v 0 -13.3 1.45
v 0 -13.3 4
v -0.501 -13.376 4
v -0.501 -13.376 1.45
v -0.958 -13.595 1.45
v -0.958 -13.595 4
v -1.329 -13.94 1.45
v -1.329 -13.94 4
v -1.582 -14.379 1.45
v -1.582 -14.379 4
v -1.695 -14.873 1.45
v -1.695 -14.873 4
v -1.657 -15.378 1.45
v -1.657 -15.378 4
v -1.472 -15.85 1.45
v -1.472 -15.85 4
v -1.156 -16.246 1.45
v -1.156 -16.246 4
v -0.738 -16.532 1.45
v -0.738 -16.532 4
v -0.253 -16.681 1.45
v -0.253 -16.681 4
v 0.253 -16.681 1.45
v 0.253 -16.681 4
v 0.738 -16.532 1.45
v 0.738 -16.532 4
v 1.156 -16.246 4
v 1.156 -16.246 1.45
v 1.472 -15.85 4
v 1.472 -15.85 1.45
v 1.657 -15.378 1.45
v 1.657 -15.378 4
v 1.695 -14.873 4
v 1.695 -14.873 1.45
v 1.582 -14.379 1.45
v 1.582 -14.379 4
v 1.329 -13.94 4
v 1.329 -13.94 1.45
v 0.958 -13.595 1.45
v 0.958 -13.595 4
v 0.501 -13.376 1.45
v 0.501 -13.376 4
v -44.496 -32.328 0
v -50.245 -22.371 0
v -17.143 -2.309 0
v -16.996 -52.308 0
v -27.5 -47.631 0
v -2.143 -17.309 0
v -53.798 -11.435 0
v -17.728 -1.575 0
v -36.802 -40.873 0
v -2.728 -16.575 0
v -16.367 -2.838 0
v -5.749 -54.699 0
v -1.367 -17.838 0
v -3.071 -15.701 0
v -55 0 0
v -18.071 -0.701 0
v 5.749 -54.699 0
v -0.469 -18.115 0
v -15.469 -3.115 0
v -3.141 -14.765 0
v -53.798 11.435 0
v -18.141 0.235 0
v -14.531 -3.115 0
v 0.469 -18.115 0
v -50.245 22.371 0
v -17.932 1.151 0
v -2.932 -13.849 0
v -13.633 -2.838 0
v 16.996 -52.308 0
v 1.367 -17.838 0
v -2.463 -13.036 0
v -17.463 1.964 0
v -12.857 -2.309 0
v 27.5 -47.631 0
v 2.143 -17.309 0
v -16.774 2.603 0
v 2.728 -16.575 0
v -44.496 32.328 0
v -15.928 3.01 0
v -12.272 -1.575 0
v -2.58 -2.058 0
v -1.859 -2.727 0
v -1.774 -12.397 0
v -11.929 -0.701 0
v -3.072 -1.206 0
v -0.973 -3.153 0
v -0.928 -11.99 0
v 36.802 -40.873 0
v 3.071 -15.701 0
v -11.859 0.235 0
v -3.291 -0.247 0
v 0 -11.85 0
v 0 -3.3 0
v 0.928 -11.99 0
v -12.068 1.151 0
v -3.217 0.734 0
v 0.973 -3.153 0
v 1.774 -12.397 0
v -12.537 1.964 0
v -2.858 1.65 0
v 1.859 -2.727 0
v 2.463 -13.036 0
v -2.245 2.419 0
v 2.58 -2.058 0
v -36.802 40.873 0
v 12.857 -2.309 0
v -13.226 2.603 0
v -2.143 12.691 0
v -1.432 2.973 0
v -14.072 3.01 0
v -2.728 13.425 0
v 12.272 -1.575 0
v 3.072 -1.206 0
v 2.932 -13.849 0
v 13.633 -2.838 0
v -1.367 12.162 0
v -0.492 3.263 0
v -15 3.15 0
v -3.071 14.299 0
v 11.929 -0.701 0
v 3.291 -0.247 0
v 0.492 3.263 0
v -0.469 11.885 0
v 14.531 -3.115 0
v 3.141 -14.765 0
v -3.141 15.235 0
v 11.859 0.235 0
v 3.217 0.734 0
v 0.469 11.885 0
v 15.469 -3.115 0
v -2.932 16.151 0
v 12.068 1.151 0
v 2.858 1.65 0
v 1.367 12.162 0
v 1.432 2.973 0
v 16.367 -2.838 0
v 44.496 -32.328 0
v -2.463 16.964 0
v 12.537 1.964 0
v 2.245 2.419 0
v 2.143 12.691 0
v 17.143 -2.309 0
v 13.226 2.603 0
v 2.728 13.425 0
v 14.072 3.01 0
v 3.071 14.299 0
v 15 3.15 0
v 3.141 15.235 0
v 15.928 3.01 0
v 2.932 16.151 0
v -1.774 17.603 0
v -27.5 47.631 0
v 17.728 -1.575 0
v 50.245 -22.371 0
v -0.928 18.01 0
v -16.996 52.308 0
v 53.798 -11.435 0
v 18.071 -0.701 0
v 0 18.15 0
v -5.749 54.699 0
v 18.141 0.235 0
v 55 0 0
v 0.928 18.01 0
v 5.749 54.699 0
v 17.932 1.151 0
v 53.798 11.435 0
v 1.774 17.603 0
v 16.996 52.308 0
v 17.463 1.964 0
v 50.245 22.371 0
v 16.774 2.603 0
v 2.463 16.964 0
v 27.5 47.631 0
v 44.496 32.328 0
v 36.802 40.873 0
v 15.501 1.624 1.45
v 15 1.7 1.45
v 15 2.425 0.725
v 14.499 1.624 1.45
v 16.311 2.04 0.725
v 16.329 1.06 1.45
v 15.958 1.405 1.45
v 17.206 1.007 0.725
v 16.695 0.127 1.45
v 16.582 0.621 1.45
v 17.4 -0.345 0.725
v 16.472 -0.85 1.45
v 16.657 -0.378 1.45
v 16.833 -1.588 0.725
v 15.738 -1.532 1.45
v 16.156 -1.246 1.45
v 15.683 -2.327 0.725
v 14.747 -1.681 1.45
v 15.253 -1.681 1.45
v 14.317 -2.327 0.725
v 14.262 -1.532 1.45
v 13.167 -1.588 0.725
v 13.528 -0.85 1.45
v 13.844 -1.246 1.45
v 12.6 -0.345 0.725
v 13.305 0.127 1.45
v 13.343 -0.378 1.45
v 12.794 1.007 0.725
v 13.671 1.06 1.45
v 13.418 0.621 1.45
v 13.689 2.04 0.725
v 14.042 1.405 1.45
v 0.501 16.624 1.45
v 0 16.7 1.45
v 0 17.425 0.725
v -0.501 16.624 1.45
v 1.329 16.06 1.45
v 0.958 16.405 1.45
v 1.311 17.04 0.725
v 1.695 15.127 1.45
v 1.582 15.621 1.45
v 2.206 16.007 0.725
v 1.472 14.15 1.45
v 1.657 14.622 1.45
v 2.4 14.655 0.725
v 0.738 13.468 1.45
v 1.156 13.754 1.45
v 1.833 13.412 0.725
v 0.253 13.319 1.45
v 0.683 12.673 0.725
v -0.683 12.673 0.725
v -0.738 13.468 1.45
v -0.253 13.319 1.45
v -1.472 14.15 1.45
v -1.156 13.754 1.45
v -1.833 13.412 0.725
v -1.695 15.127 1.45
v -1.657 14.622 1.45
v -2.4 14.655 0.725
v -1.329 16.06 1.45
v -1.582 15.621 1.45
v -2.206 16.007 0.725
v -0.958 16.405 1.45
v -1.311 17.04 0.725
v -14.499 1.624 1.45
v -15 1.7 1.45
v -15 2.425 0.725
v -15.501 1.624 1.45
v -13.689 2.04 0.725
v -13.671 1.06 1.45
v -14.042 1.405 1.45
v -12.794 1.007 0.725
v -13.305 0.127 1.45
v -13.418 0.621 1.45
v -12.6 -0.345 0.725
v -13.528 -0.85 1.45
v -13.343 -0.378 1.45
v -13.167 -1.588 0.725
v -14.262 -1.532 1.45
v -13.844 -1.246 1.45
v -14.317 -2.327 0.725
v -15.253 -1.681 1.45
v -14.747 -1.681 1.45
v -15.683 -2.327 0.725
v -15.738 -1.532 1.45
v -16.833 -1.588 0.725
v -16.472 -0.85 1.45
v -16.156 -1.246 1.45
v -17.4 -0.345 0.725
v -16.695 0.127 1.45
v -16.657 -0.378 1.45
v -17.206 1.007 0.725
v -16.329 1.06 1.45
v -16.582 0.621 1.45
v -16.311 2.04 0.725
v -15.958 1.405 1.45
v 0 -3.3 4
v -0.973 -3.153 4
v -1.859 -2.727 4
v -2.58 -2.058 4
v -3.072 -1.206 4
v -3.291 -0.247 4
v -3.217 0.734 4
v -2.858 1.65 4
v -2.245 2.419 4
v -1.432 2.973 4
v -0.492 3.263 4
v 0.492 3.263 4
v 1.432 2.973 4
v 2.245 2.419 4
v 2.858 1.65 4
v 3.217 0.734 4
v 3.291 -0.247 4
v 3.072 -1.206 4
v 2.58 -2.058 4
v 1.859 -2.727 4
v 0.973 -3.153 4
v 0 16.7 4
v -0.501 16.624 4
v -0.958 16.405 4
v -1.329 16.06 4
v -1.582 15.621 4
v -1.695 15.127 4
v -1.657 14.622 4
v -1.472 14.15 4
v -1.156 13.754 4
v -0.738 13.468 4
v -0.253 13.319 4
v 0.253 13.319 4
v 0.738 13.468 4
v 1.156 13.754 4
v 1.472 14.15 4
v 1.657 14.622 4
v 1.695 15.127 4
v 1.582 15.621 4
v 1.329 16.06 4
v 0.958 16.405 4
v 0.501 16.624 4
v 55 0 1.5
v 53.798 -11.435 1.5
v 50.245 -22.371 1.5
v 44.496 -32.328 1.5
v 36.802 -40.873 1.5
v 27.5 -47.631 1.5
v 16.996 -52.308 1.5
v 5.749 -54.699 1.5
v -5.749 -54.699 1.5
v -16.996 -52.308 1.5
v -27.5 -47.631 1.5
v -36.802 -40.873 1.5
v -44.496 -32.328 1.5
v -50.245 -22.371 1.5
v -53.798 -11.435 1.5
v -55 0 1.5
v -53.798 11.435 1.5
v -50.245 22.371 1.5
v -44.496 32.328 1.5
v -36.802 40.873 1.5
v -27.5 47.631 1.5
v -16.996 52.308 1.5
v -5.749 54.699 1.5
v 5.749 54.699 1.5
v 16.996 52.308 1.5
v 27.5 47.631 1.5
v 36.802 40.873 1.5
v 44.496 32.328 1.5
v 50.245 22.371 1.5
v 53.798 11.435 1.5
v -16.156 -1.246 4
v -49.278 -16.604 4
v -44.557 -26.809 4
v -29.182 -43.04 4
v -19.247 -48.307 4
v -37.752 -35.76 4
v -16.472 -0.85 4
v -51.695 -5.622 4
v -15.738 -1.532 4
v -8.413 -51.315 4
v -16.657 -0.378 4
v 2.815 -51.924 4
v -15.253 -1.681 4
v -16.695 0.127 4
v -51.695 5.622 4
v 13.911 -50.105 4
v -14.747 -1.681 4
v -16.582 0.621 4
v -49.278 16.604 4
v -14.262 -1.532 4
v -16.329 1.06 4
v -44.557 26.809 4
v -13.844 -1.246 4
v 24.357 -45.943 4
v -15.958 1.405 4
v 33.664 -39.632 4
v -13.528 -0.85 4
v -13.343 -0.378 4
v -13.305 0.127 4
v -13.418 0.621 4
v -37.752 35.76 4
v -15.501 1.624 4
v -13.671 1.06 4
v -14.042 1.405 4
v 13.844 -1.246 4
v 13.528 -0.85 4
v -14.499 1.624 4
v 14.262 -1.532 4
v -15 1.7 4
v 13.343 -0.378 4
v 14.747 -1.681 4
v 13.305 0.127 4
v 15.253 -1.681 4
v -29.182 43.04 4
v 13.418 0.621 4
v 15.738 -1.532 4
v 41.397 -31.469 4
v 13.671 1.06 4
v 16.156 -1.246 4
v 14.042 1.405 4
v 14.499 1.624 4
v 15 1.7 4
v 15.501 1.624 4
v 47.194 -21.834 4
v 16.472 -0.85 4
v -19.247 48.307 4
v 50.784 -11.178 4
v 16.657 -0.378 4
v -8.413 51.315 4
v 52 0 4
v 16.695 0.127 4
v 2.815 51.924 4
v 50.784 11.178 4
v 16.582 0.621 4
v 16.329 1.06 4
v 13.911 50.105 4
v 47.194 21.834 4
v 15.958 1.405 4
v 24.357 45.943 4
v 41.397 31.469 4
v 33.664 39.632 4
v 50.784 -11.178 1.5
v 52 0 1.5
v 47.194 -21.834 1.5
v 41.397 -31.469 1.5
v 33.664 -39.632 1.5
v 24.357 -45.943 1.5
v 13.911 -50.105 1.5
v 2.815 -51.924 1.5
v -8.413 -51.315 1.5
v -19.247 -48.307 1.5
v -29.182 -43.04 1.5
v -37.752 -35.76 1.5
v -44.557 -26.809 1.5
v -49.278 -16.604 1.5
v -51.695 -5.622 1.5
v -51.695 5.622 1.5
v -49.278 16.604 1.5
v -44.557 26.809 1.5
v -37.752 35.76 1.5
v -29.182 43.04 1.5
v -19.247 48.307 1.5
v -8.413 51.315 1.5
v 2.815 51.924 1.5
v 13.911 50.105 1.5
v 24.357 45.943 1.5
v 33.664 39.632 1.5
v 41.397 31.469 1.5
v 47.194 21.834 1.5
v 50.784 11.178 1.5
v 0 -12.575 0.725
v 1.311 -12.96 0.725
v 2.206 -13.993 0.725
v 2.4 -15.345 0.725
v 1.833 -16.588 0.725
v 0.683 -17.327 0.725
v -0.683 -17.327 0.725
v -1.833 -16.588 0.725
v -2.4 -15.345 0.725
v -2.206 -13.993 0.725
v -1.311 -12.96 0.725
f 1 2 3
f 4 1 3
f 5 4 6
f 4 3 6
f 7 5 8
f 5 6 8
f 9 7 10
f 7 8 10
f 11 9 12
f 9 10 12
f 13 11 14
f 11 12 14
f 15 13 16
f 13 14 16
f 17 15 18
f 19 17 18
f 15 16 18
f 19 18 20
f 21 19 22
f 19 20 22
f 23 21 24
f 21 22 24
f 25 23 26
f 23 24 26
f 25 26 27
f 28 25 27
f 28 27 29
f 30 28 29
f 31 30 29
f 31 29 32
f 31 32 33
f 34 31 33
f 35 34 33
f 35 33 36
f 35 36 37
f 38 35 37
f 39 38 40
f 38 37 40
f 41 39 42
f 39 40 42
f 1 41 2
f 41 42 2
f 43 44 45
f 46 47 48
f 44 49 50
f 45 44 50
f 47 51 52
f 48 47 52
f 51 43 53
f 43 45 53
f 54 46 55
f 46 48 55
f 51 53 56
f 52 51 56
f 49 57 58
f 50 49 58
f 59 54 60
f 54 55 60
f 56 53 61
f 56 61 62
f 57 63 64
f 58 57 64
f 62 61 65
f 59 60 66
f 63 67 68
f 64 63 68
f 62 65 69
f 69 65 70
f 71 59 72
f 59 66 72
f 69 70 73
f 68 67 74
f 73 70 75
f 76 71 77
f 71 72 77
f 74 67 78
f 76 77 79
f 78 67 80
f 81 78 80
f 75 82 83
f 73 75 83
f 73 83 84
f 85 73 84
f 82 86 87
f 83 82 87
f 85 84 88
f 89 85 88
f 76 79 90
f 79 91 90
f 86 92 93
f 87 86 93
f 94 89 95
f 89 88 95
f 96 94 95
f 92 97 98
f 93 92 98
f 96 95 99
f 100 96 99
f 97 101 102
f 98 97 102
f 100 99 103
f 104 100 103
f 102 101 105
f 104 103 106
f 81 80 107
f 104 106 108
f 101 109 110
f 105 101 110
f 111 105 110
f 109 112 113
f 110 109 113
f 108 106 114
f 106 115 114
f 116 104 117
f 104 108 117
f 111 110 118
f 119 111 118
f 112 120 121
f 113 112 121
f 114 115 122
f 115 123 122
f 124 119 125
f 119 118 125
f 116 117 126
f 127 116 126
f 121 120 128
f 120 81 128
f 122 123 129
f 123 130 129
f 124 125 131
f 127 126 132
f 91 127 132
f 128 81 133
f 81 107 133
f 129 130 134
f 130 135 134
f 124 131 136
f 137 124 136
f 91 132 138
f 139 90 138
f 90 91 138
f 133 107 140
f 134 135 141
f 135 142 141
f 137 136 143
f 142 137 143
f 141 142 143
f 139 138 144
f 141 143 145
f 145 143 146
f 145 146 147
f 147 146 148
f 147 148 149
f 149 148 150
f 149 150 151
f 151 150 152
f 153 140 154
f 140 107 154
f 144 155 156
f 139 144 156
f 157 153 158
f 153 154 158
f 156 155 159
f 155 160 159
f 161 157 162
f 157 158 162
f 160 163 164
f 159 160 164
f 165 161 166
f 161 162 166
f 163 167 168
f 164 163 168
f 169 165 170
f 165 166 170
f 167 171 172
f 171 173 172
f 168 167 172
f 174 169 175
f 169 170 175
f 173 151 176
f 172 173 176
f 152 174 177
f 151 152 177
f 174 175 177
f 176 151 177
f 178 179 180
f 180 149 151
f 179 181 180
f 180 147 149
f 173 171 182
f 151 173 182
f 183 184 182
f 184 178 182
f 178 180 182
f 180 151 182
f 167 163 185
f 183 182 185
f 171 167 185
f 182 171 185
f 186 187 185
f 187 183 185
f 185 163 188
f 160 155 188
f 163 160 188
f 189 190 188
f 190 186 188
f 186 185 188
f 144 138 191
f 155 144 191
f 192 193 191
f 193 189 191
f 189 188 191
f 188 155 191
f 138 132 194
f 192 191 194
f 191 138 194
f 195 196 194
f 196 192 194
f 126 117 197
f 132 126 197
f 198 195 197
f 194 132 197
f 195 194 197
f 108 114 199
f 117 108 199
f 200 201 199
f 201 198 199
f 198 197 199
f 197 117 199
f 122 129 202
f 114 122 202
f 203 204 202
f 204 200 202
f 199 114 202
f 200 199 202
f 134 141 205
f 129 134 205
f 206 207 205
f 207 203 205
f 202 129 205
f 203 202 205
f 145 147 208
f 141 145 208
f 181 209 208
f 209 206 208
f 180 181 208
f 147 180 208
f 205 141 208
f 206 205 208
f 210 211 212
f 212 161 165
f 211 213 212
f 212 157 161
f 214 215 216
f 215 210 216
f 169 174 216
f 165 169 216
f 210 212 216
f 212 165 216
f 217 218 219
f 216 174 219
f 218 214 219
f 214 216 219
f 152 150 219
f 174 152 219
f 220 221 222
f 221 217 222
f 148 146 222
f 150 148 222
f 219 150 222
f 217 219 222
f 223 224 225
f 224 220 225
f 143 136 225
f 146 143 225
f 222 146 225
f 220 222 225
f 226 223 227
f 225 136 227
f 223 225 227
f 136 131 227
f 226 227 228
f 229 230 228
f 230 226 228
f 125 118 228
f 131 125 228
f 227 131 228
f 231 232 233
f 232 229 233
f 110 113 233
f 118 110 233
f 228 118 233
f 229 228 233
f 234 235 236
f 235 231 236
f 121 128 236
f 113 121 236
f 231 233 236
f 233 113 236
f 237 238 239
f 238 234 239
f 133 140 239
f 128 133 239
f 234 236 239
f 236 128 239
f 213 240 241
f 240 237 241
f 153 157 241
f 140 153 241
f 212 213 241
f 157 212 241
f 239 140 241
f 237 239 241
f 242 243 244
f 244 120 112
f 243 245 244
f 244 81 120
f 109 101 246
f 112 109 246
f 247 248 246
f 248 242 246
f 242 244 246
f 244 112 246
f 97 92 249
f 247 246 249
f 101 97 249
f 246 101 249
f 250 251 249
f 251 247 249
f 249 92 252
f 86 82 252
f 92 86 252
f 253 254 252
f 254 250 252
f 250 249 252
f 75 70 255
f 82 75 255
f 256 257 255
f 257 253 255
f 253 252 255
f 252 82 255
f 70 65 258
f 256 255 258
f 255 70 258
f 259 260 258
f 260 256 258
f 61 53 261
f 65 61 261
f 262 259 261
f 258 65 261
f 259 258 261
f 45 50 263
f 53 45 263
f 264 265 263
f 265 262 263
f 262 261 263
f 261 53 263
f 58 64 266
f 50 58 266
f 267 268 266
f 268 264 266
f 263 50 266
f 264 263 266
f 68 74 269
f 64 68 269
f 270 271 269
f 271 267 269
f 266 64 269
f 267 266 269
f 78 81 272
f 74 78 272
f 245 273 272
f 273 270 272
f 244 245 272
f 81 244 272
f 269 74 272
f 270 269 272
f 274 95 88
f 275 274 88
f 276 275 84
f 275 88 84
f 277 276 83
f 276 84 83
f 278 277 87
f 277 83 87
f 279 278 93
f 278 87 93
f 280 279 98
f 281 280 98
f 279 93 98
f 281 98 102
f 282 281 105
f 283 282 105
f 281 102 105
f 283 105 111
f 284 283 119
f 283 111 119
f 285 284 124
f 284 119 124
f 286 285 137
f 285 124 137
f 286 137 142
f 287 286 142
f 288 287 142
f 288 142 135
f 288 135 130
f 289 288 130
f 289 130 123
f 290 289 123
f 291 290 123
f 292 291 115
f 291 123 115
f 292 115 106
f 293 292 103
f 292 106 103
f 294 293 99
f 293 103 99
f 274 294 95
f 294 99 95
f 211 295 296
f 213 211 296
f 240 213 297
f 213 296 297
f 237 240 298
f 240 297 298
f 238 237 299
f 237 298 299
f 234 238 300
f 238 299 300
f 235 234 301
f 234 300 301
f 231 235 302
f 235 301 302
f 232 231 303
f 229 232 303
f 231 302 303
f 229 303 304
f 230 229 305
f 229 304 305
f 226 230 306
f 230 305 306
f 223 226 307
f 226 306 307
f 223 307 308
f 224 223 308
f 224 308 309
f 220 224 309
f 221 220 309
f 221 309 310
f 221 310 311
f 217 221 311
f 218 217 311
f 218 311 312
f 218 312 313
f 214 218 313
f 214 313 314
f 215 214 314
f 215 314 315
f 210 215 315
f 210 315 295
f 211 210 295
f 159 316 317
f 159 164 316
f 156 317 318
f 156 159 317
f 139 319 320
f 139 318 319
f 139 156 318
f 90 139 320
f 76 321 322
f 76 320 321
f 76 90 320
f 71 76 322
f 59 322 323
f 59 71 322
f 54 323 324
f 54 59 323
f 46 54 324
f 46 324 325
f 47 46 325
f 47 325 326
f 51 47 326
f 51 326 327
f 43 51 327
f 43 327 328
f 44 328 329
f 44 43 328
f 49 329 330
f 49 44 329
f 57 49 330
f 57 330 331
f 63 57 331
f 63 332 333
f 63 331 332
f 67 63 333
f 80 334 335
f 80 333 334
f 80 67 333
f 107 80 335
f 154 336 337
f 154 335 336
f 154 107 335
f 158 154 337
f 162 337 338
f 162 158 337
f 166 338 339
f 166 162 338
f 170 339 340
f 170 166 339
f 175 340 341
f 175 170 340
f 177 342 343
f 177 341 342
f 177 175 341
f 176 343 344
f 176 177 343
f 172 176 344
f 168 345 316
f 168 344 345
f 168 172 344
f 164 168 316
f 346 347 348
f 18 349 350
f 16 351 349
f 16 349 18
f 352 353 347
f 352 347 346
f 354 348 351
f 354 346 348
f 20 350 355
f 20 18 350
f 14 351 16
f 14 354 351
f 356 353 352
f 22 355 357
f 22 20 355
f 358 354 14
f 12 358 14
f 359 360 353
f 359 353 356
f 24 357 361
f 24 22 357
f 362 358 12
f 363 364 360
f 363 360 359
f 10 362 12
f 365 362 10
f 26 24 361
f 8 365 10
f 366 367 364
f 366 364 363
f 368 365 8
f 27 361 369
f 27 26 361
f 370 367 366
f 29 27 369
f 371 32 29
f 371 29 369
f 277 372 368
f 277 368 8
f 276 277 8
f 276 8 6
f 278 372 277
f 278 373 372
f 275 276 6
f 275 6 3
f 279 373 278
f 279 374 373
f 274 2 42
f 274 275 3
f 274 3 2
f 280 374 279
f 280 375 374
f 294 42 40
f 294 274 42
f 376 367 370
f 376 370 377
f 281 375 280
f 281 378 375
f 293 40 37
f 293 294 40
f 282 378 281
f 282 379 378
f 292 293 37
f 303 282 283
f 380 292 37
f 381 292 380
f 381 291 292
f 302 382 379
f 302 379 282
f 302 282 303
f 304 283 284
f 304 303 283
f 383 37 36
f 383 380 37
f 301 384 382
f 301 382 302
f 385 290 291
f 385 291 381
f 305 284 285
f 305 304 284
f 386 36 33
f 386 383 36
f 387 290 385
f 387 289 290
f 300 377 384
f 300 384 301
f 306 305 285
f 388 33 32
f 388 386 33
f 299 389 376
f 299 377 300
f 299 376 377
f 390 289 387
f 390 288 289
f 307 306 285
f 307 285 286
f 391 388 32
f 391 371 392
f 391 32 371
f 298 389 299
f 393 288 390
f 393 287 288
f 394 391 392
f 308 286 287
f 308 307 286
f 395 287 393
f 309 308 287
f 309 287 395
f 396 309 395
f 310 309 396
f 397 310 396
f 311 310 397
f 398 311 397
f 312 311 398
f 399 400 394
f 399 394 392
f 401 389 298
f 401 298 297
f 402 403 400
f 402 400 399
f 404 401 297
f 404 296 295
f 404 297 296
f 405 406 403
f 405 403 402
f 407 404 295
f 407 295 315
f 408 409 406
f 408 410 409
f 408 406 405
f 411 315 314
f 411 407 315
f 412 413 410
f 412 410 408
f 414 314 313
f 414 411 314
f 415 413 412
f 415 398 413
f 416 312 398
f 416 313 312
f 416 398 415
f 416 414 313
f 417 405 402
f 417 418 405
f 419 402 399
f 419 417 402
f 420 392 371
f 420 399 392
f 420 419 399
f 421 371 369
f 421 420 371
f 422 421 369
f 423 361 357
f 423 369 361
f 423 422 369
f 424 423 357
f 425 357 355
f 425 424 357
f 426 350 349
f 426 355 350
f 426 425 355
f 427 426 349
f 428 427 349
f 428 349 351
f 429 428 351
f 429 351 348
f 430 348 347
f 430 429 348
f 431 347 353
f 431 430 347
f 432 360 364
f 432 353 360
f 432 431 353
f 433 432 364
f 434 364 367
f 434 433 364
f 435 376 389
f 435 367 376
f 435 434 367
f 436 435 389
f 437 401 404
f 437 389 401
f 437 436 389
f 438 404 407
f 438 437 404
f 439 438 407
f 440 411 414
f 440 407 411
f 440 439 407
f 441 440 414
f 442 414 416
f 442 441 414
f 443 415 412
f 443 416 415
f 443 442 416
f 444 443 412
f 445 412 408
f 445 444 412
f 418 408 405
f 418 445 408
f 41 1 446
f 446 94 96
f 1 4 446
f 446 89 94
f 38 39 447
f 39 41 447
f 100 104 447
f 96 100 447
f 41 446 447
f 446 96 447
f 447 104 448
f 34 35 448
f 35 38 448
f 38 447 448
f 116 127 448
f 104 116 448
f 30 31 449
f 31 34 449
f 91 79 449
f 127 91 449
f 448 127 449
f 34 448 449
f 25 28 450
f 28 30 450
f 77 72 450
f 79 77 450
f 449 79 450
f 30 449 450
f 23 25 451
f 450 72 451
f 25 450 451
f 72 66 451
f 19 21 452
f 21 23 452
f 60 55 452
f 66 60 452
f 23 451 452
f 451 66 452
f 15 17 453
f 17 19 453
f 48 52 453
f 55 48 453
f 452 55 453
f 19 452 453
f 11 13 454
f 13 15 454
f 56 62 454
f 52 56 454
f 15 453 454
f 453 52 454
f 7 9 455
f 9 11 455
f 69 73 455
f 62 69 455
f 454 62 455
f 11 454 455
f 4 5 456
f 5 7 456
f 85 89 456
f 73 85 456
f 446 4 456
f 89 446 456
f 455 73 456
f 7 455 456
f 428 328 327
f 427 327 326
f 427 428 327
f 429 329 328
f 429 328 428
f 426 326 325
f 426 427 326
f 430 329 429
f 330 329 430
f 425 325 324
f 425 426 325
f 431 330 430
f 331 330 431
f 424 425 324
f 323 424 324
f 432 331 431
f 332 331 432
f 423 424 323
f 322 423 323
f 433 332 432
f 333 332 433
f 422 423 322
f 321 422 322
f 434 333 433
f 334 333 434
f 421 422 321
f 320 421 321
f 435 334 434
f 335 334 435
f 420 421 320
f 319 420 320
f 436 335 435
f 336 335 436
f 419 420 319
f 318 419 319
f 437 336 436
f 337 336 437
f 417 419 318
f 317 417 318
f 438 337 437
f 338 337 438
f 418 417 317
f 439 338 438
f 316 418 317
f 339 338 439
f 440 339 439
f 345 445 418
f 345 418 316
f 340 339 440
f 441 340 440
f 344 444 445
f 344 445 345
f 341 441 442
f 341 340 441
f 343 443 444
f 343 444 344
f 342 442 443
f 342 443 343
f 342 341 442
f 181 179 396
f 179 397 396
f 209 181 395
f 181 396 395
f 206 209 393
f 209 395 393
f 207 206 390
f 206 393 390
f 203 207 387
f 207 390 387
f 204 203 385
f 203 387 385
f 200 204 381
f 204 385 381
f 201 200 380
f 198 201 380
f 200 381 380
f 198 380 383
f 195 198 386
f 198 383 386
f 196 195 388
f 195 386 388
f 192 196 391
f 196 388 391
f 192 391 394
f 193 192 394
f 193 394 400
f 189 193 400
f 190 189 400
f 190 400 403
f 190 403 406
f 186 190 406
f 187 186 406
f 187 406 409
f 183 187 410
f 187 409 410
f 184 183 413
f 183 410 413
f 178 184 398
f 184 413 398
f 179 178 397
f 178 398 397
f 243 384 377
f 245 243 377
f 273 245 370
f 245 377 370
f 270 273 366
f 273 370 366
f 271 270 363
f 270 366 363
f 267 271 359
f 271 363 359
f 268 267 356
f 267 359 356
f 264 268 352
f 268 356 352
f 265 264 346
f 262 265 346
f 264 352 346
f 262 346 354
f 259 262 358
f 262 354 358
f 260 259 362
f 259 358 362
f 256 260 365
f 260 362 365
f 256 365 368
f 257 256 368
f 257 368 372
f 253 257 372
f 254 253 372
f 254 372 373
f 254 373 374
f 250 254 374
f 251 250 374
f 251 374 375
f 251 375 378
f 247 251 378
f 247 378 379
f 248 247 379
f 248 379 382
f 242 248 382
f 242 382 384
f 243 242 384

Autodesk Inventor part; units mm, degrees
ref_plane "YZ Plane" through (0, 0, 0) normal (1, 0, 0) x (0, 1, 0)
ref_plane "XZ Plane" through (0, 0, 0) normal (0, 1, 0) x (-1, 0, 0)
ref_plane "XY Plane" through (0, 0, 0) normal (0, 0, 1) x (1, 0, 0)
sketch "Sketch1" plane through (0, 0, 0) normal (0, 0, 1) x (1, 0, 0)
  circle A0 centre (0, 0) radius 55
  dimension "d0" = 110
extrude "Extrusion1" add sketch "Sketch1" along normal blind 1.5
sketch "Sketch2" plane through (0, 0, 1.5) normal (0, 0, 1) x (1, 0, 0)
  circle A0 centre (0, 0) radius 52
  dimension "d3" = 104
extrude "Extrusion2" add sketch "Sketch2" along normal blind 2.5
sketch "Sketch4" plane through (0, 0, 4) normal (0, 0, 1) x (1, 0, 0)
  point P0 (0, 0)
  point P1 (0, 0)
hole "Hole1" at (0, 0, 4) direction (0, 0, -1) diameter 6.6 end through all clearance for "Hex Head Cap Screw DIN EN 24017" size "M6" standard "DIN"
sketch "Sketch5" plane through (0, 0, 0) normal (0, 0, -1) x (-1, 0, 0)
  circle A0 centre (0, 0) radius 15 construction
  point P0 (15, 0)
  point P1 (0, -15)
  point P2 (-15, 0)
  point P3 (0, 15)
  dimension "d13" = 30
hole "Hole2" at (-15, 0, 0) at (0, -15, 0) at (15, 0, 0) at (0, 15, 0) direction (0, 0, 1) diameter 3.4 depth 8 tip angle 118 countersink diameter 6.3 countersink angle 90 clearance for "Countersunk Flat Head Screw DIN EN ISO 2009" size "M3" standard "DIN"
properties part number "Seconday_End_Top" material "Polycarbonate, Clear"
